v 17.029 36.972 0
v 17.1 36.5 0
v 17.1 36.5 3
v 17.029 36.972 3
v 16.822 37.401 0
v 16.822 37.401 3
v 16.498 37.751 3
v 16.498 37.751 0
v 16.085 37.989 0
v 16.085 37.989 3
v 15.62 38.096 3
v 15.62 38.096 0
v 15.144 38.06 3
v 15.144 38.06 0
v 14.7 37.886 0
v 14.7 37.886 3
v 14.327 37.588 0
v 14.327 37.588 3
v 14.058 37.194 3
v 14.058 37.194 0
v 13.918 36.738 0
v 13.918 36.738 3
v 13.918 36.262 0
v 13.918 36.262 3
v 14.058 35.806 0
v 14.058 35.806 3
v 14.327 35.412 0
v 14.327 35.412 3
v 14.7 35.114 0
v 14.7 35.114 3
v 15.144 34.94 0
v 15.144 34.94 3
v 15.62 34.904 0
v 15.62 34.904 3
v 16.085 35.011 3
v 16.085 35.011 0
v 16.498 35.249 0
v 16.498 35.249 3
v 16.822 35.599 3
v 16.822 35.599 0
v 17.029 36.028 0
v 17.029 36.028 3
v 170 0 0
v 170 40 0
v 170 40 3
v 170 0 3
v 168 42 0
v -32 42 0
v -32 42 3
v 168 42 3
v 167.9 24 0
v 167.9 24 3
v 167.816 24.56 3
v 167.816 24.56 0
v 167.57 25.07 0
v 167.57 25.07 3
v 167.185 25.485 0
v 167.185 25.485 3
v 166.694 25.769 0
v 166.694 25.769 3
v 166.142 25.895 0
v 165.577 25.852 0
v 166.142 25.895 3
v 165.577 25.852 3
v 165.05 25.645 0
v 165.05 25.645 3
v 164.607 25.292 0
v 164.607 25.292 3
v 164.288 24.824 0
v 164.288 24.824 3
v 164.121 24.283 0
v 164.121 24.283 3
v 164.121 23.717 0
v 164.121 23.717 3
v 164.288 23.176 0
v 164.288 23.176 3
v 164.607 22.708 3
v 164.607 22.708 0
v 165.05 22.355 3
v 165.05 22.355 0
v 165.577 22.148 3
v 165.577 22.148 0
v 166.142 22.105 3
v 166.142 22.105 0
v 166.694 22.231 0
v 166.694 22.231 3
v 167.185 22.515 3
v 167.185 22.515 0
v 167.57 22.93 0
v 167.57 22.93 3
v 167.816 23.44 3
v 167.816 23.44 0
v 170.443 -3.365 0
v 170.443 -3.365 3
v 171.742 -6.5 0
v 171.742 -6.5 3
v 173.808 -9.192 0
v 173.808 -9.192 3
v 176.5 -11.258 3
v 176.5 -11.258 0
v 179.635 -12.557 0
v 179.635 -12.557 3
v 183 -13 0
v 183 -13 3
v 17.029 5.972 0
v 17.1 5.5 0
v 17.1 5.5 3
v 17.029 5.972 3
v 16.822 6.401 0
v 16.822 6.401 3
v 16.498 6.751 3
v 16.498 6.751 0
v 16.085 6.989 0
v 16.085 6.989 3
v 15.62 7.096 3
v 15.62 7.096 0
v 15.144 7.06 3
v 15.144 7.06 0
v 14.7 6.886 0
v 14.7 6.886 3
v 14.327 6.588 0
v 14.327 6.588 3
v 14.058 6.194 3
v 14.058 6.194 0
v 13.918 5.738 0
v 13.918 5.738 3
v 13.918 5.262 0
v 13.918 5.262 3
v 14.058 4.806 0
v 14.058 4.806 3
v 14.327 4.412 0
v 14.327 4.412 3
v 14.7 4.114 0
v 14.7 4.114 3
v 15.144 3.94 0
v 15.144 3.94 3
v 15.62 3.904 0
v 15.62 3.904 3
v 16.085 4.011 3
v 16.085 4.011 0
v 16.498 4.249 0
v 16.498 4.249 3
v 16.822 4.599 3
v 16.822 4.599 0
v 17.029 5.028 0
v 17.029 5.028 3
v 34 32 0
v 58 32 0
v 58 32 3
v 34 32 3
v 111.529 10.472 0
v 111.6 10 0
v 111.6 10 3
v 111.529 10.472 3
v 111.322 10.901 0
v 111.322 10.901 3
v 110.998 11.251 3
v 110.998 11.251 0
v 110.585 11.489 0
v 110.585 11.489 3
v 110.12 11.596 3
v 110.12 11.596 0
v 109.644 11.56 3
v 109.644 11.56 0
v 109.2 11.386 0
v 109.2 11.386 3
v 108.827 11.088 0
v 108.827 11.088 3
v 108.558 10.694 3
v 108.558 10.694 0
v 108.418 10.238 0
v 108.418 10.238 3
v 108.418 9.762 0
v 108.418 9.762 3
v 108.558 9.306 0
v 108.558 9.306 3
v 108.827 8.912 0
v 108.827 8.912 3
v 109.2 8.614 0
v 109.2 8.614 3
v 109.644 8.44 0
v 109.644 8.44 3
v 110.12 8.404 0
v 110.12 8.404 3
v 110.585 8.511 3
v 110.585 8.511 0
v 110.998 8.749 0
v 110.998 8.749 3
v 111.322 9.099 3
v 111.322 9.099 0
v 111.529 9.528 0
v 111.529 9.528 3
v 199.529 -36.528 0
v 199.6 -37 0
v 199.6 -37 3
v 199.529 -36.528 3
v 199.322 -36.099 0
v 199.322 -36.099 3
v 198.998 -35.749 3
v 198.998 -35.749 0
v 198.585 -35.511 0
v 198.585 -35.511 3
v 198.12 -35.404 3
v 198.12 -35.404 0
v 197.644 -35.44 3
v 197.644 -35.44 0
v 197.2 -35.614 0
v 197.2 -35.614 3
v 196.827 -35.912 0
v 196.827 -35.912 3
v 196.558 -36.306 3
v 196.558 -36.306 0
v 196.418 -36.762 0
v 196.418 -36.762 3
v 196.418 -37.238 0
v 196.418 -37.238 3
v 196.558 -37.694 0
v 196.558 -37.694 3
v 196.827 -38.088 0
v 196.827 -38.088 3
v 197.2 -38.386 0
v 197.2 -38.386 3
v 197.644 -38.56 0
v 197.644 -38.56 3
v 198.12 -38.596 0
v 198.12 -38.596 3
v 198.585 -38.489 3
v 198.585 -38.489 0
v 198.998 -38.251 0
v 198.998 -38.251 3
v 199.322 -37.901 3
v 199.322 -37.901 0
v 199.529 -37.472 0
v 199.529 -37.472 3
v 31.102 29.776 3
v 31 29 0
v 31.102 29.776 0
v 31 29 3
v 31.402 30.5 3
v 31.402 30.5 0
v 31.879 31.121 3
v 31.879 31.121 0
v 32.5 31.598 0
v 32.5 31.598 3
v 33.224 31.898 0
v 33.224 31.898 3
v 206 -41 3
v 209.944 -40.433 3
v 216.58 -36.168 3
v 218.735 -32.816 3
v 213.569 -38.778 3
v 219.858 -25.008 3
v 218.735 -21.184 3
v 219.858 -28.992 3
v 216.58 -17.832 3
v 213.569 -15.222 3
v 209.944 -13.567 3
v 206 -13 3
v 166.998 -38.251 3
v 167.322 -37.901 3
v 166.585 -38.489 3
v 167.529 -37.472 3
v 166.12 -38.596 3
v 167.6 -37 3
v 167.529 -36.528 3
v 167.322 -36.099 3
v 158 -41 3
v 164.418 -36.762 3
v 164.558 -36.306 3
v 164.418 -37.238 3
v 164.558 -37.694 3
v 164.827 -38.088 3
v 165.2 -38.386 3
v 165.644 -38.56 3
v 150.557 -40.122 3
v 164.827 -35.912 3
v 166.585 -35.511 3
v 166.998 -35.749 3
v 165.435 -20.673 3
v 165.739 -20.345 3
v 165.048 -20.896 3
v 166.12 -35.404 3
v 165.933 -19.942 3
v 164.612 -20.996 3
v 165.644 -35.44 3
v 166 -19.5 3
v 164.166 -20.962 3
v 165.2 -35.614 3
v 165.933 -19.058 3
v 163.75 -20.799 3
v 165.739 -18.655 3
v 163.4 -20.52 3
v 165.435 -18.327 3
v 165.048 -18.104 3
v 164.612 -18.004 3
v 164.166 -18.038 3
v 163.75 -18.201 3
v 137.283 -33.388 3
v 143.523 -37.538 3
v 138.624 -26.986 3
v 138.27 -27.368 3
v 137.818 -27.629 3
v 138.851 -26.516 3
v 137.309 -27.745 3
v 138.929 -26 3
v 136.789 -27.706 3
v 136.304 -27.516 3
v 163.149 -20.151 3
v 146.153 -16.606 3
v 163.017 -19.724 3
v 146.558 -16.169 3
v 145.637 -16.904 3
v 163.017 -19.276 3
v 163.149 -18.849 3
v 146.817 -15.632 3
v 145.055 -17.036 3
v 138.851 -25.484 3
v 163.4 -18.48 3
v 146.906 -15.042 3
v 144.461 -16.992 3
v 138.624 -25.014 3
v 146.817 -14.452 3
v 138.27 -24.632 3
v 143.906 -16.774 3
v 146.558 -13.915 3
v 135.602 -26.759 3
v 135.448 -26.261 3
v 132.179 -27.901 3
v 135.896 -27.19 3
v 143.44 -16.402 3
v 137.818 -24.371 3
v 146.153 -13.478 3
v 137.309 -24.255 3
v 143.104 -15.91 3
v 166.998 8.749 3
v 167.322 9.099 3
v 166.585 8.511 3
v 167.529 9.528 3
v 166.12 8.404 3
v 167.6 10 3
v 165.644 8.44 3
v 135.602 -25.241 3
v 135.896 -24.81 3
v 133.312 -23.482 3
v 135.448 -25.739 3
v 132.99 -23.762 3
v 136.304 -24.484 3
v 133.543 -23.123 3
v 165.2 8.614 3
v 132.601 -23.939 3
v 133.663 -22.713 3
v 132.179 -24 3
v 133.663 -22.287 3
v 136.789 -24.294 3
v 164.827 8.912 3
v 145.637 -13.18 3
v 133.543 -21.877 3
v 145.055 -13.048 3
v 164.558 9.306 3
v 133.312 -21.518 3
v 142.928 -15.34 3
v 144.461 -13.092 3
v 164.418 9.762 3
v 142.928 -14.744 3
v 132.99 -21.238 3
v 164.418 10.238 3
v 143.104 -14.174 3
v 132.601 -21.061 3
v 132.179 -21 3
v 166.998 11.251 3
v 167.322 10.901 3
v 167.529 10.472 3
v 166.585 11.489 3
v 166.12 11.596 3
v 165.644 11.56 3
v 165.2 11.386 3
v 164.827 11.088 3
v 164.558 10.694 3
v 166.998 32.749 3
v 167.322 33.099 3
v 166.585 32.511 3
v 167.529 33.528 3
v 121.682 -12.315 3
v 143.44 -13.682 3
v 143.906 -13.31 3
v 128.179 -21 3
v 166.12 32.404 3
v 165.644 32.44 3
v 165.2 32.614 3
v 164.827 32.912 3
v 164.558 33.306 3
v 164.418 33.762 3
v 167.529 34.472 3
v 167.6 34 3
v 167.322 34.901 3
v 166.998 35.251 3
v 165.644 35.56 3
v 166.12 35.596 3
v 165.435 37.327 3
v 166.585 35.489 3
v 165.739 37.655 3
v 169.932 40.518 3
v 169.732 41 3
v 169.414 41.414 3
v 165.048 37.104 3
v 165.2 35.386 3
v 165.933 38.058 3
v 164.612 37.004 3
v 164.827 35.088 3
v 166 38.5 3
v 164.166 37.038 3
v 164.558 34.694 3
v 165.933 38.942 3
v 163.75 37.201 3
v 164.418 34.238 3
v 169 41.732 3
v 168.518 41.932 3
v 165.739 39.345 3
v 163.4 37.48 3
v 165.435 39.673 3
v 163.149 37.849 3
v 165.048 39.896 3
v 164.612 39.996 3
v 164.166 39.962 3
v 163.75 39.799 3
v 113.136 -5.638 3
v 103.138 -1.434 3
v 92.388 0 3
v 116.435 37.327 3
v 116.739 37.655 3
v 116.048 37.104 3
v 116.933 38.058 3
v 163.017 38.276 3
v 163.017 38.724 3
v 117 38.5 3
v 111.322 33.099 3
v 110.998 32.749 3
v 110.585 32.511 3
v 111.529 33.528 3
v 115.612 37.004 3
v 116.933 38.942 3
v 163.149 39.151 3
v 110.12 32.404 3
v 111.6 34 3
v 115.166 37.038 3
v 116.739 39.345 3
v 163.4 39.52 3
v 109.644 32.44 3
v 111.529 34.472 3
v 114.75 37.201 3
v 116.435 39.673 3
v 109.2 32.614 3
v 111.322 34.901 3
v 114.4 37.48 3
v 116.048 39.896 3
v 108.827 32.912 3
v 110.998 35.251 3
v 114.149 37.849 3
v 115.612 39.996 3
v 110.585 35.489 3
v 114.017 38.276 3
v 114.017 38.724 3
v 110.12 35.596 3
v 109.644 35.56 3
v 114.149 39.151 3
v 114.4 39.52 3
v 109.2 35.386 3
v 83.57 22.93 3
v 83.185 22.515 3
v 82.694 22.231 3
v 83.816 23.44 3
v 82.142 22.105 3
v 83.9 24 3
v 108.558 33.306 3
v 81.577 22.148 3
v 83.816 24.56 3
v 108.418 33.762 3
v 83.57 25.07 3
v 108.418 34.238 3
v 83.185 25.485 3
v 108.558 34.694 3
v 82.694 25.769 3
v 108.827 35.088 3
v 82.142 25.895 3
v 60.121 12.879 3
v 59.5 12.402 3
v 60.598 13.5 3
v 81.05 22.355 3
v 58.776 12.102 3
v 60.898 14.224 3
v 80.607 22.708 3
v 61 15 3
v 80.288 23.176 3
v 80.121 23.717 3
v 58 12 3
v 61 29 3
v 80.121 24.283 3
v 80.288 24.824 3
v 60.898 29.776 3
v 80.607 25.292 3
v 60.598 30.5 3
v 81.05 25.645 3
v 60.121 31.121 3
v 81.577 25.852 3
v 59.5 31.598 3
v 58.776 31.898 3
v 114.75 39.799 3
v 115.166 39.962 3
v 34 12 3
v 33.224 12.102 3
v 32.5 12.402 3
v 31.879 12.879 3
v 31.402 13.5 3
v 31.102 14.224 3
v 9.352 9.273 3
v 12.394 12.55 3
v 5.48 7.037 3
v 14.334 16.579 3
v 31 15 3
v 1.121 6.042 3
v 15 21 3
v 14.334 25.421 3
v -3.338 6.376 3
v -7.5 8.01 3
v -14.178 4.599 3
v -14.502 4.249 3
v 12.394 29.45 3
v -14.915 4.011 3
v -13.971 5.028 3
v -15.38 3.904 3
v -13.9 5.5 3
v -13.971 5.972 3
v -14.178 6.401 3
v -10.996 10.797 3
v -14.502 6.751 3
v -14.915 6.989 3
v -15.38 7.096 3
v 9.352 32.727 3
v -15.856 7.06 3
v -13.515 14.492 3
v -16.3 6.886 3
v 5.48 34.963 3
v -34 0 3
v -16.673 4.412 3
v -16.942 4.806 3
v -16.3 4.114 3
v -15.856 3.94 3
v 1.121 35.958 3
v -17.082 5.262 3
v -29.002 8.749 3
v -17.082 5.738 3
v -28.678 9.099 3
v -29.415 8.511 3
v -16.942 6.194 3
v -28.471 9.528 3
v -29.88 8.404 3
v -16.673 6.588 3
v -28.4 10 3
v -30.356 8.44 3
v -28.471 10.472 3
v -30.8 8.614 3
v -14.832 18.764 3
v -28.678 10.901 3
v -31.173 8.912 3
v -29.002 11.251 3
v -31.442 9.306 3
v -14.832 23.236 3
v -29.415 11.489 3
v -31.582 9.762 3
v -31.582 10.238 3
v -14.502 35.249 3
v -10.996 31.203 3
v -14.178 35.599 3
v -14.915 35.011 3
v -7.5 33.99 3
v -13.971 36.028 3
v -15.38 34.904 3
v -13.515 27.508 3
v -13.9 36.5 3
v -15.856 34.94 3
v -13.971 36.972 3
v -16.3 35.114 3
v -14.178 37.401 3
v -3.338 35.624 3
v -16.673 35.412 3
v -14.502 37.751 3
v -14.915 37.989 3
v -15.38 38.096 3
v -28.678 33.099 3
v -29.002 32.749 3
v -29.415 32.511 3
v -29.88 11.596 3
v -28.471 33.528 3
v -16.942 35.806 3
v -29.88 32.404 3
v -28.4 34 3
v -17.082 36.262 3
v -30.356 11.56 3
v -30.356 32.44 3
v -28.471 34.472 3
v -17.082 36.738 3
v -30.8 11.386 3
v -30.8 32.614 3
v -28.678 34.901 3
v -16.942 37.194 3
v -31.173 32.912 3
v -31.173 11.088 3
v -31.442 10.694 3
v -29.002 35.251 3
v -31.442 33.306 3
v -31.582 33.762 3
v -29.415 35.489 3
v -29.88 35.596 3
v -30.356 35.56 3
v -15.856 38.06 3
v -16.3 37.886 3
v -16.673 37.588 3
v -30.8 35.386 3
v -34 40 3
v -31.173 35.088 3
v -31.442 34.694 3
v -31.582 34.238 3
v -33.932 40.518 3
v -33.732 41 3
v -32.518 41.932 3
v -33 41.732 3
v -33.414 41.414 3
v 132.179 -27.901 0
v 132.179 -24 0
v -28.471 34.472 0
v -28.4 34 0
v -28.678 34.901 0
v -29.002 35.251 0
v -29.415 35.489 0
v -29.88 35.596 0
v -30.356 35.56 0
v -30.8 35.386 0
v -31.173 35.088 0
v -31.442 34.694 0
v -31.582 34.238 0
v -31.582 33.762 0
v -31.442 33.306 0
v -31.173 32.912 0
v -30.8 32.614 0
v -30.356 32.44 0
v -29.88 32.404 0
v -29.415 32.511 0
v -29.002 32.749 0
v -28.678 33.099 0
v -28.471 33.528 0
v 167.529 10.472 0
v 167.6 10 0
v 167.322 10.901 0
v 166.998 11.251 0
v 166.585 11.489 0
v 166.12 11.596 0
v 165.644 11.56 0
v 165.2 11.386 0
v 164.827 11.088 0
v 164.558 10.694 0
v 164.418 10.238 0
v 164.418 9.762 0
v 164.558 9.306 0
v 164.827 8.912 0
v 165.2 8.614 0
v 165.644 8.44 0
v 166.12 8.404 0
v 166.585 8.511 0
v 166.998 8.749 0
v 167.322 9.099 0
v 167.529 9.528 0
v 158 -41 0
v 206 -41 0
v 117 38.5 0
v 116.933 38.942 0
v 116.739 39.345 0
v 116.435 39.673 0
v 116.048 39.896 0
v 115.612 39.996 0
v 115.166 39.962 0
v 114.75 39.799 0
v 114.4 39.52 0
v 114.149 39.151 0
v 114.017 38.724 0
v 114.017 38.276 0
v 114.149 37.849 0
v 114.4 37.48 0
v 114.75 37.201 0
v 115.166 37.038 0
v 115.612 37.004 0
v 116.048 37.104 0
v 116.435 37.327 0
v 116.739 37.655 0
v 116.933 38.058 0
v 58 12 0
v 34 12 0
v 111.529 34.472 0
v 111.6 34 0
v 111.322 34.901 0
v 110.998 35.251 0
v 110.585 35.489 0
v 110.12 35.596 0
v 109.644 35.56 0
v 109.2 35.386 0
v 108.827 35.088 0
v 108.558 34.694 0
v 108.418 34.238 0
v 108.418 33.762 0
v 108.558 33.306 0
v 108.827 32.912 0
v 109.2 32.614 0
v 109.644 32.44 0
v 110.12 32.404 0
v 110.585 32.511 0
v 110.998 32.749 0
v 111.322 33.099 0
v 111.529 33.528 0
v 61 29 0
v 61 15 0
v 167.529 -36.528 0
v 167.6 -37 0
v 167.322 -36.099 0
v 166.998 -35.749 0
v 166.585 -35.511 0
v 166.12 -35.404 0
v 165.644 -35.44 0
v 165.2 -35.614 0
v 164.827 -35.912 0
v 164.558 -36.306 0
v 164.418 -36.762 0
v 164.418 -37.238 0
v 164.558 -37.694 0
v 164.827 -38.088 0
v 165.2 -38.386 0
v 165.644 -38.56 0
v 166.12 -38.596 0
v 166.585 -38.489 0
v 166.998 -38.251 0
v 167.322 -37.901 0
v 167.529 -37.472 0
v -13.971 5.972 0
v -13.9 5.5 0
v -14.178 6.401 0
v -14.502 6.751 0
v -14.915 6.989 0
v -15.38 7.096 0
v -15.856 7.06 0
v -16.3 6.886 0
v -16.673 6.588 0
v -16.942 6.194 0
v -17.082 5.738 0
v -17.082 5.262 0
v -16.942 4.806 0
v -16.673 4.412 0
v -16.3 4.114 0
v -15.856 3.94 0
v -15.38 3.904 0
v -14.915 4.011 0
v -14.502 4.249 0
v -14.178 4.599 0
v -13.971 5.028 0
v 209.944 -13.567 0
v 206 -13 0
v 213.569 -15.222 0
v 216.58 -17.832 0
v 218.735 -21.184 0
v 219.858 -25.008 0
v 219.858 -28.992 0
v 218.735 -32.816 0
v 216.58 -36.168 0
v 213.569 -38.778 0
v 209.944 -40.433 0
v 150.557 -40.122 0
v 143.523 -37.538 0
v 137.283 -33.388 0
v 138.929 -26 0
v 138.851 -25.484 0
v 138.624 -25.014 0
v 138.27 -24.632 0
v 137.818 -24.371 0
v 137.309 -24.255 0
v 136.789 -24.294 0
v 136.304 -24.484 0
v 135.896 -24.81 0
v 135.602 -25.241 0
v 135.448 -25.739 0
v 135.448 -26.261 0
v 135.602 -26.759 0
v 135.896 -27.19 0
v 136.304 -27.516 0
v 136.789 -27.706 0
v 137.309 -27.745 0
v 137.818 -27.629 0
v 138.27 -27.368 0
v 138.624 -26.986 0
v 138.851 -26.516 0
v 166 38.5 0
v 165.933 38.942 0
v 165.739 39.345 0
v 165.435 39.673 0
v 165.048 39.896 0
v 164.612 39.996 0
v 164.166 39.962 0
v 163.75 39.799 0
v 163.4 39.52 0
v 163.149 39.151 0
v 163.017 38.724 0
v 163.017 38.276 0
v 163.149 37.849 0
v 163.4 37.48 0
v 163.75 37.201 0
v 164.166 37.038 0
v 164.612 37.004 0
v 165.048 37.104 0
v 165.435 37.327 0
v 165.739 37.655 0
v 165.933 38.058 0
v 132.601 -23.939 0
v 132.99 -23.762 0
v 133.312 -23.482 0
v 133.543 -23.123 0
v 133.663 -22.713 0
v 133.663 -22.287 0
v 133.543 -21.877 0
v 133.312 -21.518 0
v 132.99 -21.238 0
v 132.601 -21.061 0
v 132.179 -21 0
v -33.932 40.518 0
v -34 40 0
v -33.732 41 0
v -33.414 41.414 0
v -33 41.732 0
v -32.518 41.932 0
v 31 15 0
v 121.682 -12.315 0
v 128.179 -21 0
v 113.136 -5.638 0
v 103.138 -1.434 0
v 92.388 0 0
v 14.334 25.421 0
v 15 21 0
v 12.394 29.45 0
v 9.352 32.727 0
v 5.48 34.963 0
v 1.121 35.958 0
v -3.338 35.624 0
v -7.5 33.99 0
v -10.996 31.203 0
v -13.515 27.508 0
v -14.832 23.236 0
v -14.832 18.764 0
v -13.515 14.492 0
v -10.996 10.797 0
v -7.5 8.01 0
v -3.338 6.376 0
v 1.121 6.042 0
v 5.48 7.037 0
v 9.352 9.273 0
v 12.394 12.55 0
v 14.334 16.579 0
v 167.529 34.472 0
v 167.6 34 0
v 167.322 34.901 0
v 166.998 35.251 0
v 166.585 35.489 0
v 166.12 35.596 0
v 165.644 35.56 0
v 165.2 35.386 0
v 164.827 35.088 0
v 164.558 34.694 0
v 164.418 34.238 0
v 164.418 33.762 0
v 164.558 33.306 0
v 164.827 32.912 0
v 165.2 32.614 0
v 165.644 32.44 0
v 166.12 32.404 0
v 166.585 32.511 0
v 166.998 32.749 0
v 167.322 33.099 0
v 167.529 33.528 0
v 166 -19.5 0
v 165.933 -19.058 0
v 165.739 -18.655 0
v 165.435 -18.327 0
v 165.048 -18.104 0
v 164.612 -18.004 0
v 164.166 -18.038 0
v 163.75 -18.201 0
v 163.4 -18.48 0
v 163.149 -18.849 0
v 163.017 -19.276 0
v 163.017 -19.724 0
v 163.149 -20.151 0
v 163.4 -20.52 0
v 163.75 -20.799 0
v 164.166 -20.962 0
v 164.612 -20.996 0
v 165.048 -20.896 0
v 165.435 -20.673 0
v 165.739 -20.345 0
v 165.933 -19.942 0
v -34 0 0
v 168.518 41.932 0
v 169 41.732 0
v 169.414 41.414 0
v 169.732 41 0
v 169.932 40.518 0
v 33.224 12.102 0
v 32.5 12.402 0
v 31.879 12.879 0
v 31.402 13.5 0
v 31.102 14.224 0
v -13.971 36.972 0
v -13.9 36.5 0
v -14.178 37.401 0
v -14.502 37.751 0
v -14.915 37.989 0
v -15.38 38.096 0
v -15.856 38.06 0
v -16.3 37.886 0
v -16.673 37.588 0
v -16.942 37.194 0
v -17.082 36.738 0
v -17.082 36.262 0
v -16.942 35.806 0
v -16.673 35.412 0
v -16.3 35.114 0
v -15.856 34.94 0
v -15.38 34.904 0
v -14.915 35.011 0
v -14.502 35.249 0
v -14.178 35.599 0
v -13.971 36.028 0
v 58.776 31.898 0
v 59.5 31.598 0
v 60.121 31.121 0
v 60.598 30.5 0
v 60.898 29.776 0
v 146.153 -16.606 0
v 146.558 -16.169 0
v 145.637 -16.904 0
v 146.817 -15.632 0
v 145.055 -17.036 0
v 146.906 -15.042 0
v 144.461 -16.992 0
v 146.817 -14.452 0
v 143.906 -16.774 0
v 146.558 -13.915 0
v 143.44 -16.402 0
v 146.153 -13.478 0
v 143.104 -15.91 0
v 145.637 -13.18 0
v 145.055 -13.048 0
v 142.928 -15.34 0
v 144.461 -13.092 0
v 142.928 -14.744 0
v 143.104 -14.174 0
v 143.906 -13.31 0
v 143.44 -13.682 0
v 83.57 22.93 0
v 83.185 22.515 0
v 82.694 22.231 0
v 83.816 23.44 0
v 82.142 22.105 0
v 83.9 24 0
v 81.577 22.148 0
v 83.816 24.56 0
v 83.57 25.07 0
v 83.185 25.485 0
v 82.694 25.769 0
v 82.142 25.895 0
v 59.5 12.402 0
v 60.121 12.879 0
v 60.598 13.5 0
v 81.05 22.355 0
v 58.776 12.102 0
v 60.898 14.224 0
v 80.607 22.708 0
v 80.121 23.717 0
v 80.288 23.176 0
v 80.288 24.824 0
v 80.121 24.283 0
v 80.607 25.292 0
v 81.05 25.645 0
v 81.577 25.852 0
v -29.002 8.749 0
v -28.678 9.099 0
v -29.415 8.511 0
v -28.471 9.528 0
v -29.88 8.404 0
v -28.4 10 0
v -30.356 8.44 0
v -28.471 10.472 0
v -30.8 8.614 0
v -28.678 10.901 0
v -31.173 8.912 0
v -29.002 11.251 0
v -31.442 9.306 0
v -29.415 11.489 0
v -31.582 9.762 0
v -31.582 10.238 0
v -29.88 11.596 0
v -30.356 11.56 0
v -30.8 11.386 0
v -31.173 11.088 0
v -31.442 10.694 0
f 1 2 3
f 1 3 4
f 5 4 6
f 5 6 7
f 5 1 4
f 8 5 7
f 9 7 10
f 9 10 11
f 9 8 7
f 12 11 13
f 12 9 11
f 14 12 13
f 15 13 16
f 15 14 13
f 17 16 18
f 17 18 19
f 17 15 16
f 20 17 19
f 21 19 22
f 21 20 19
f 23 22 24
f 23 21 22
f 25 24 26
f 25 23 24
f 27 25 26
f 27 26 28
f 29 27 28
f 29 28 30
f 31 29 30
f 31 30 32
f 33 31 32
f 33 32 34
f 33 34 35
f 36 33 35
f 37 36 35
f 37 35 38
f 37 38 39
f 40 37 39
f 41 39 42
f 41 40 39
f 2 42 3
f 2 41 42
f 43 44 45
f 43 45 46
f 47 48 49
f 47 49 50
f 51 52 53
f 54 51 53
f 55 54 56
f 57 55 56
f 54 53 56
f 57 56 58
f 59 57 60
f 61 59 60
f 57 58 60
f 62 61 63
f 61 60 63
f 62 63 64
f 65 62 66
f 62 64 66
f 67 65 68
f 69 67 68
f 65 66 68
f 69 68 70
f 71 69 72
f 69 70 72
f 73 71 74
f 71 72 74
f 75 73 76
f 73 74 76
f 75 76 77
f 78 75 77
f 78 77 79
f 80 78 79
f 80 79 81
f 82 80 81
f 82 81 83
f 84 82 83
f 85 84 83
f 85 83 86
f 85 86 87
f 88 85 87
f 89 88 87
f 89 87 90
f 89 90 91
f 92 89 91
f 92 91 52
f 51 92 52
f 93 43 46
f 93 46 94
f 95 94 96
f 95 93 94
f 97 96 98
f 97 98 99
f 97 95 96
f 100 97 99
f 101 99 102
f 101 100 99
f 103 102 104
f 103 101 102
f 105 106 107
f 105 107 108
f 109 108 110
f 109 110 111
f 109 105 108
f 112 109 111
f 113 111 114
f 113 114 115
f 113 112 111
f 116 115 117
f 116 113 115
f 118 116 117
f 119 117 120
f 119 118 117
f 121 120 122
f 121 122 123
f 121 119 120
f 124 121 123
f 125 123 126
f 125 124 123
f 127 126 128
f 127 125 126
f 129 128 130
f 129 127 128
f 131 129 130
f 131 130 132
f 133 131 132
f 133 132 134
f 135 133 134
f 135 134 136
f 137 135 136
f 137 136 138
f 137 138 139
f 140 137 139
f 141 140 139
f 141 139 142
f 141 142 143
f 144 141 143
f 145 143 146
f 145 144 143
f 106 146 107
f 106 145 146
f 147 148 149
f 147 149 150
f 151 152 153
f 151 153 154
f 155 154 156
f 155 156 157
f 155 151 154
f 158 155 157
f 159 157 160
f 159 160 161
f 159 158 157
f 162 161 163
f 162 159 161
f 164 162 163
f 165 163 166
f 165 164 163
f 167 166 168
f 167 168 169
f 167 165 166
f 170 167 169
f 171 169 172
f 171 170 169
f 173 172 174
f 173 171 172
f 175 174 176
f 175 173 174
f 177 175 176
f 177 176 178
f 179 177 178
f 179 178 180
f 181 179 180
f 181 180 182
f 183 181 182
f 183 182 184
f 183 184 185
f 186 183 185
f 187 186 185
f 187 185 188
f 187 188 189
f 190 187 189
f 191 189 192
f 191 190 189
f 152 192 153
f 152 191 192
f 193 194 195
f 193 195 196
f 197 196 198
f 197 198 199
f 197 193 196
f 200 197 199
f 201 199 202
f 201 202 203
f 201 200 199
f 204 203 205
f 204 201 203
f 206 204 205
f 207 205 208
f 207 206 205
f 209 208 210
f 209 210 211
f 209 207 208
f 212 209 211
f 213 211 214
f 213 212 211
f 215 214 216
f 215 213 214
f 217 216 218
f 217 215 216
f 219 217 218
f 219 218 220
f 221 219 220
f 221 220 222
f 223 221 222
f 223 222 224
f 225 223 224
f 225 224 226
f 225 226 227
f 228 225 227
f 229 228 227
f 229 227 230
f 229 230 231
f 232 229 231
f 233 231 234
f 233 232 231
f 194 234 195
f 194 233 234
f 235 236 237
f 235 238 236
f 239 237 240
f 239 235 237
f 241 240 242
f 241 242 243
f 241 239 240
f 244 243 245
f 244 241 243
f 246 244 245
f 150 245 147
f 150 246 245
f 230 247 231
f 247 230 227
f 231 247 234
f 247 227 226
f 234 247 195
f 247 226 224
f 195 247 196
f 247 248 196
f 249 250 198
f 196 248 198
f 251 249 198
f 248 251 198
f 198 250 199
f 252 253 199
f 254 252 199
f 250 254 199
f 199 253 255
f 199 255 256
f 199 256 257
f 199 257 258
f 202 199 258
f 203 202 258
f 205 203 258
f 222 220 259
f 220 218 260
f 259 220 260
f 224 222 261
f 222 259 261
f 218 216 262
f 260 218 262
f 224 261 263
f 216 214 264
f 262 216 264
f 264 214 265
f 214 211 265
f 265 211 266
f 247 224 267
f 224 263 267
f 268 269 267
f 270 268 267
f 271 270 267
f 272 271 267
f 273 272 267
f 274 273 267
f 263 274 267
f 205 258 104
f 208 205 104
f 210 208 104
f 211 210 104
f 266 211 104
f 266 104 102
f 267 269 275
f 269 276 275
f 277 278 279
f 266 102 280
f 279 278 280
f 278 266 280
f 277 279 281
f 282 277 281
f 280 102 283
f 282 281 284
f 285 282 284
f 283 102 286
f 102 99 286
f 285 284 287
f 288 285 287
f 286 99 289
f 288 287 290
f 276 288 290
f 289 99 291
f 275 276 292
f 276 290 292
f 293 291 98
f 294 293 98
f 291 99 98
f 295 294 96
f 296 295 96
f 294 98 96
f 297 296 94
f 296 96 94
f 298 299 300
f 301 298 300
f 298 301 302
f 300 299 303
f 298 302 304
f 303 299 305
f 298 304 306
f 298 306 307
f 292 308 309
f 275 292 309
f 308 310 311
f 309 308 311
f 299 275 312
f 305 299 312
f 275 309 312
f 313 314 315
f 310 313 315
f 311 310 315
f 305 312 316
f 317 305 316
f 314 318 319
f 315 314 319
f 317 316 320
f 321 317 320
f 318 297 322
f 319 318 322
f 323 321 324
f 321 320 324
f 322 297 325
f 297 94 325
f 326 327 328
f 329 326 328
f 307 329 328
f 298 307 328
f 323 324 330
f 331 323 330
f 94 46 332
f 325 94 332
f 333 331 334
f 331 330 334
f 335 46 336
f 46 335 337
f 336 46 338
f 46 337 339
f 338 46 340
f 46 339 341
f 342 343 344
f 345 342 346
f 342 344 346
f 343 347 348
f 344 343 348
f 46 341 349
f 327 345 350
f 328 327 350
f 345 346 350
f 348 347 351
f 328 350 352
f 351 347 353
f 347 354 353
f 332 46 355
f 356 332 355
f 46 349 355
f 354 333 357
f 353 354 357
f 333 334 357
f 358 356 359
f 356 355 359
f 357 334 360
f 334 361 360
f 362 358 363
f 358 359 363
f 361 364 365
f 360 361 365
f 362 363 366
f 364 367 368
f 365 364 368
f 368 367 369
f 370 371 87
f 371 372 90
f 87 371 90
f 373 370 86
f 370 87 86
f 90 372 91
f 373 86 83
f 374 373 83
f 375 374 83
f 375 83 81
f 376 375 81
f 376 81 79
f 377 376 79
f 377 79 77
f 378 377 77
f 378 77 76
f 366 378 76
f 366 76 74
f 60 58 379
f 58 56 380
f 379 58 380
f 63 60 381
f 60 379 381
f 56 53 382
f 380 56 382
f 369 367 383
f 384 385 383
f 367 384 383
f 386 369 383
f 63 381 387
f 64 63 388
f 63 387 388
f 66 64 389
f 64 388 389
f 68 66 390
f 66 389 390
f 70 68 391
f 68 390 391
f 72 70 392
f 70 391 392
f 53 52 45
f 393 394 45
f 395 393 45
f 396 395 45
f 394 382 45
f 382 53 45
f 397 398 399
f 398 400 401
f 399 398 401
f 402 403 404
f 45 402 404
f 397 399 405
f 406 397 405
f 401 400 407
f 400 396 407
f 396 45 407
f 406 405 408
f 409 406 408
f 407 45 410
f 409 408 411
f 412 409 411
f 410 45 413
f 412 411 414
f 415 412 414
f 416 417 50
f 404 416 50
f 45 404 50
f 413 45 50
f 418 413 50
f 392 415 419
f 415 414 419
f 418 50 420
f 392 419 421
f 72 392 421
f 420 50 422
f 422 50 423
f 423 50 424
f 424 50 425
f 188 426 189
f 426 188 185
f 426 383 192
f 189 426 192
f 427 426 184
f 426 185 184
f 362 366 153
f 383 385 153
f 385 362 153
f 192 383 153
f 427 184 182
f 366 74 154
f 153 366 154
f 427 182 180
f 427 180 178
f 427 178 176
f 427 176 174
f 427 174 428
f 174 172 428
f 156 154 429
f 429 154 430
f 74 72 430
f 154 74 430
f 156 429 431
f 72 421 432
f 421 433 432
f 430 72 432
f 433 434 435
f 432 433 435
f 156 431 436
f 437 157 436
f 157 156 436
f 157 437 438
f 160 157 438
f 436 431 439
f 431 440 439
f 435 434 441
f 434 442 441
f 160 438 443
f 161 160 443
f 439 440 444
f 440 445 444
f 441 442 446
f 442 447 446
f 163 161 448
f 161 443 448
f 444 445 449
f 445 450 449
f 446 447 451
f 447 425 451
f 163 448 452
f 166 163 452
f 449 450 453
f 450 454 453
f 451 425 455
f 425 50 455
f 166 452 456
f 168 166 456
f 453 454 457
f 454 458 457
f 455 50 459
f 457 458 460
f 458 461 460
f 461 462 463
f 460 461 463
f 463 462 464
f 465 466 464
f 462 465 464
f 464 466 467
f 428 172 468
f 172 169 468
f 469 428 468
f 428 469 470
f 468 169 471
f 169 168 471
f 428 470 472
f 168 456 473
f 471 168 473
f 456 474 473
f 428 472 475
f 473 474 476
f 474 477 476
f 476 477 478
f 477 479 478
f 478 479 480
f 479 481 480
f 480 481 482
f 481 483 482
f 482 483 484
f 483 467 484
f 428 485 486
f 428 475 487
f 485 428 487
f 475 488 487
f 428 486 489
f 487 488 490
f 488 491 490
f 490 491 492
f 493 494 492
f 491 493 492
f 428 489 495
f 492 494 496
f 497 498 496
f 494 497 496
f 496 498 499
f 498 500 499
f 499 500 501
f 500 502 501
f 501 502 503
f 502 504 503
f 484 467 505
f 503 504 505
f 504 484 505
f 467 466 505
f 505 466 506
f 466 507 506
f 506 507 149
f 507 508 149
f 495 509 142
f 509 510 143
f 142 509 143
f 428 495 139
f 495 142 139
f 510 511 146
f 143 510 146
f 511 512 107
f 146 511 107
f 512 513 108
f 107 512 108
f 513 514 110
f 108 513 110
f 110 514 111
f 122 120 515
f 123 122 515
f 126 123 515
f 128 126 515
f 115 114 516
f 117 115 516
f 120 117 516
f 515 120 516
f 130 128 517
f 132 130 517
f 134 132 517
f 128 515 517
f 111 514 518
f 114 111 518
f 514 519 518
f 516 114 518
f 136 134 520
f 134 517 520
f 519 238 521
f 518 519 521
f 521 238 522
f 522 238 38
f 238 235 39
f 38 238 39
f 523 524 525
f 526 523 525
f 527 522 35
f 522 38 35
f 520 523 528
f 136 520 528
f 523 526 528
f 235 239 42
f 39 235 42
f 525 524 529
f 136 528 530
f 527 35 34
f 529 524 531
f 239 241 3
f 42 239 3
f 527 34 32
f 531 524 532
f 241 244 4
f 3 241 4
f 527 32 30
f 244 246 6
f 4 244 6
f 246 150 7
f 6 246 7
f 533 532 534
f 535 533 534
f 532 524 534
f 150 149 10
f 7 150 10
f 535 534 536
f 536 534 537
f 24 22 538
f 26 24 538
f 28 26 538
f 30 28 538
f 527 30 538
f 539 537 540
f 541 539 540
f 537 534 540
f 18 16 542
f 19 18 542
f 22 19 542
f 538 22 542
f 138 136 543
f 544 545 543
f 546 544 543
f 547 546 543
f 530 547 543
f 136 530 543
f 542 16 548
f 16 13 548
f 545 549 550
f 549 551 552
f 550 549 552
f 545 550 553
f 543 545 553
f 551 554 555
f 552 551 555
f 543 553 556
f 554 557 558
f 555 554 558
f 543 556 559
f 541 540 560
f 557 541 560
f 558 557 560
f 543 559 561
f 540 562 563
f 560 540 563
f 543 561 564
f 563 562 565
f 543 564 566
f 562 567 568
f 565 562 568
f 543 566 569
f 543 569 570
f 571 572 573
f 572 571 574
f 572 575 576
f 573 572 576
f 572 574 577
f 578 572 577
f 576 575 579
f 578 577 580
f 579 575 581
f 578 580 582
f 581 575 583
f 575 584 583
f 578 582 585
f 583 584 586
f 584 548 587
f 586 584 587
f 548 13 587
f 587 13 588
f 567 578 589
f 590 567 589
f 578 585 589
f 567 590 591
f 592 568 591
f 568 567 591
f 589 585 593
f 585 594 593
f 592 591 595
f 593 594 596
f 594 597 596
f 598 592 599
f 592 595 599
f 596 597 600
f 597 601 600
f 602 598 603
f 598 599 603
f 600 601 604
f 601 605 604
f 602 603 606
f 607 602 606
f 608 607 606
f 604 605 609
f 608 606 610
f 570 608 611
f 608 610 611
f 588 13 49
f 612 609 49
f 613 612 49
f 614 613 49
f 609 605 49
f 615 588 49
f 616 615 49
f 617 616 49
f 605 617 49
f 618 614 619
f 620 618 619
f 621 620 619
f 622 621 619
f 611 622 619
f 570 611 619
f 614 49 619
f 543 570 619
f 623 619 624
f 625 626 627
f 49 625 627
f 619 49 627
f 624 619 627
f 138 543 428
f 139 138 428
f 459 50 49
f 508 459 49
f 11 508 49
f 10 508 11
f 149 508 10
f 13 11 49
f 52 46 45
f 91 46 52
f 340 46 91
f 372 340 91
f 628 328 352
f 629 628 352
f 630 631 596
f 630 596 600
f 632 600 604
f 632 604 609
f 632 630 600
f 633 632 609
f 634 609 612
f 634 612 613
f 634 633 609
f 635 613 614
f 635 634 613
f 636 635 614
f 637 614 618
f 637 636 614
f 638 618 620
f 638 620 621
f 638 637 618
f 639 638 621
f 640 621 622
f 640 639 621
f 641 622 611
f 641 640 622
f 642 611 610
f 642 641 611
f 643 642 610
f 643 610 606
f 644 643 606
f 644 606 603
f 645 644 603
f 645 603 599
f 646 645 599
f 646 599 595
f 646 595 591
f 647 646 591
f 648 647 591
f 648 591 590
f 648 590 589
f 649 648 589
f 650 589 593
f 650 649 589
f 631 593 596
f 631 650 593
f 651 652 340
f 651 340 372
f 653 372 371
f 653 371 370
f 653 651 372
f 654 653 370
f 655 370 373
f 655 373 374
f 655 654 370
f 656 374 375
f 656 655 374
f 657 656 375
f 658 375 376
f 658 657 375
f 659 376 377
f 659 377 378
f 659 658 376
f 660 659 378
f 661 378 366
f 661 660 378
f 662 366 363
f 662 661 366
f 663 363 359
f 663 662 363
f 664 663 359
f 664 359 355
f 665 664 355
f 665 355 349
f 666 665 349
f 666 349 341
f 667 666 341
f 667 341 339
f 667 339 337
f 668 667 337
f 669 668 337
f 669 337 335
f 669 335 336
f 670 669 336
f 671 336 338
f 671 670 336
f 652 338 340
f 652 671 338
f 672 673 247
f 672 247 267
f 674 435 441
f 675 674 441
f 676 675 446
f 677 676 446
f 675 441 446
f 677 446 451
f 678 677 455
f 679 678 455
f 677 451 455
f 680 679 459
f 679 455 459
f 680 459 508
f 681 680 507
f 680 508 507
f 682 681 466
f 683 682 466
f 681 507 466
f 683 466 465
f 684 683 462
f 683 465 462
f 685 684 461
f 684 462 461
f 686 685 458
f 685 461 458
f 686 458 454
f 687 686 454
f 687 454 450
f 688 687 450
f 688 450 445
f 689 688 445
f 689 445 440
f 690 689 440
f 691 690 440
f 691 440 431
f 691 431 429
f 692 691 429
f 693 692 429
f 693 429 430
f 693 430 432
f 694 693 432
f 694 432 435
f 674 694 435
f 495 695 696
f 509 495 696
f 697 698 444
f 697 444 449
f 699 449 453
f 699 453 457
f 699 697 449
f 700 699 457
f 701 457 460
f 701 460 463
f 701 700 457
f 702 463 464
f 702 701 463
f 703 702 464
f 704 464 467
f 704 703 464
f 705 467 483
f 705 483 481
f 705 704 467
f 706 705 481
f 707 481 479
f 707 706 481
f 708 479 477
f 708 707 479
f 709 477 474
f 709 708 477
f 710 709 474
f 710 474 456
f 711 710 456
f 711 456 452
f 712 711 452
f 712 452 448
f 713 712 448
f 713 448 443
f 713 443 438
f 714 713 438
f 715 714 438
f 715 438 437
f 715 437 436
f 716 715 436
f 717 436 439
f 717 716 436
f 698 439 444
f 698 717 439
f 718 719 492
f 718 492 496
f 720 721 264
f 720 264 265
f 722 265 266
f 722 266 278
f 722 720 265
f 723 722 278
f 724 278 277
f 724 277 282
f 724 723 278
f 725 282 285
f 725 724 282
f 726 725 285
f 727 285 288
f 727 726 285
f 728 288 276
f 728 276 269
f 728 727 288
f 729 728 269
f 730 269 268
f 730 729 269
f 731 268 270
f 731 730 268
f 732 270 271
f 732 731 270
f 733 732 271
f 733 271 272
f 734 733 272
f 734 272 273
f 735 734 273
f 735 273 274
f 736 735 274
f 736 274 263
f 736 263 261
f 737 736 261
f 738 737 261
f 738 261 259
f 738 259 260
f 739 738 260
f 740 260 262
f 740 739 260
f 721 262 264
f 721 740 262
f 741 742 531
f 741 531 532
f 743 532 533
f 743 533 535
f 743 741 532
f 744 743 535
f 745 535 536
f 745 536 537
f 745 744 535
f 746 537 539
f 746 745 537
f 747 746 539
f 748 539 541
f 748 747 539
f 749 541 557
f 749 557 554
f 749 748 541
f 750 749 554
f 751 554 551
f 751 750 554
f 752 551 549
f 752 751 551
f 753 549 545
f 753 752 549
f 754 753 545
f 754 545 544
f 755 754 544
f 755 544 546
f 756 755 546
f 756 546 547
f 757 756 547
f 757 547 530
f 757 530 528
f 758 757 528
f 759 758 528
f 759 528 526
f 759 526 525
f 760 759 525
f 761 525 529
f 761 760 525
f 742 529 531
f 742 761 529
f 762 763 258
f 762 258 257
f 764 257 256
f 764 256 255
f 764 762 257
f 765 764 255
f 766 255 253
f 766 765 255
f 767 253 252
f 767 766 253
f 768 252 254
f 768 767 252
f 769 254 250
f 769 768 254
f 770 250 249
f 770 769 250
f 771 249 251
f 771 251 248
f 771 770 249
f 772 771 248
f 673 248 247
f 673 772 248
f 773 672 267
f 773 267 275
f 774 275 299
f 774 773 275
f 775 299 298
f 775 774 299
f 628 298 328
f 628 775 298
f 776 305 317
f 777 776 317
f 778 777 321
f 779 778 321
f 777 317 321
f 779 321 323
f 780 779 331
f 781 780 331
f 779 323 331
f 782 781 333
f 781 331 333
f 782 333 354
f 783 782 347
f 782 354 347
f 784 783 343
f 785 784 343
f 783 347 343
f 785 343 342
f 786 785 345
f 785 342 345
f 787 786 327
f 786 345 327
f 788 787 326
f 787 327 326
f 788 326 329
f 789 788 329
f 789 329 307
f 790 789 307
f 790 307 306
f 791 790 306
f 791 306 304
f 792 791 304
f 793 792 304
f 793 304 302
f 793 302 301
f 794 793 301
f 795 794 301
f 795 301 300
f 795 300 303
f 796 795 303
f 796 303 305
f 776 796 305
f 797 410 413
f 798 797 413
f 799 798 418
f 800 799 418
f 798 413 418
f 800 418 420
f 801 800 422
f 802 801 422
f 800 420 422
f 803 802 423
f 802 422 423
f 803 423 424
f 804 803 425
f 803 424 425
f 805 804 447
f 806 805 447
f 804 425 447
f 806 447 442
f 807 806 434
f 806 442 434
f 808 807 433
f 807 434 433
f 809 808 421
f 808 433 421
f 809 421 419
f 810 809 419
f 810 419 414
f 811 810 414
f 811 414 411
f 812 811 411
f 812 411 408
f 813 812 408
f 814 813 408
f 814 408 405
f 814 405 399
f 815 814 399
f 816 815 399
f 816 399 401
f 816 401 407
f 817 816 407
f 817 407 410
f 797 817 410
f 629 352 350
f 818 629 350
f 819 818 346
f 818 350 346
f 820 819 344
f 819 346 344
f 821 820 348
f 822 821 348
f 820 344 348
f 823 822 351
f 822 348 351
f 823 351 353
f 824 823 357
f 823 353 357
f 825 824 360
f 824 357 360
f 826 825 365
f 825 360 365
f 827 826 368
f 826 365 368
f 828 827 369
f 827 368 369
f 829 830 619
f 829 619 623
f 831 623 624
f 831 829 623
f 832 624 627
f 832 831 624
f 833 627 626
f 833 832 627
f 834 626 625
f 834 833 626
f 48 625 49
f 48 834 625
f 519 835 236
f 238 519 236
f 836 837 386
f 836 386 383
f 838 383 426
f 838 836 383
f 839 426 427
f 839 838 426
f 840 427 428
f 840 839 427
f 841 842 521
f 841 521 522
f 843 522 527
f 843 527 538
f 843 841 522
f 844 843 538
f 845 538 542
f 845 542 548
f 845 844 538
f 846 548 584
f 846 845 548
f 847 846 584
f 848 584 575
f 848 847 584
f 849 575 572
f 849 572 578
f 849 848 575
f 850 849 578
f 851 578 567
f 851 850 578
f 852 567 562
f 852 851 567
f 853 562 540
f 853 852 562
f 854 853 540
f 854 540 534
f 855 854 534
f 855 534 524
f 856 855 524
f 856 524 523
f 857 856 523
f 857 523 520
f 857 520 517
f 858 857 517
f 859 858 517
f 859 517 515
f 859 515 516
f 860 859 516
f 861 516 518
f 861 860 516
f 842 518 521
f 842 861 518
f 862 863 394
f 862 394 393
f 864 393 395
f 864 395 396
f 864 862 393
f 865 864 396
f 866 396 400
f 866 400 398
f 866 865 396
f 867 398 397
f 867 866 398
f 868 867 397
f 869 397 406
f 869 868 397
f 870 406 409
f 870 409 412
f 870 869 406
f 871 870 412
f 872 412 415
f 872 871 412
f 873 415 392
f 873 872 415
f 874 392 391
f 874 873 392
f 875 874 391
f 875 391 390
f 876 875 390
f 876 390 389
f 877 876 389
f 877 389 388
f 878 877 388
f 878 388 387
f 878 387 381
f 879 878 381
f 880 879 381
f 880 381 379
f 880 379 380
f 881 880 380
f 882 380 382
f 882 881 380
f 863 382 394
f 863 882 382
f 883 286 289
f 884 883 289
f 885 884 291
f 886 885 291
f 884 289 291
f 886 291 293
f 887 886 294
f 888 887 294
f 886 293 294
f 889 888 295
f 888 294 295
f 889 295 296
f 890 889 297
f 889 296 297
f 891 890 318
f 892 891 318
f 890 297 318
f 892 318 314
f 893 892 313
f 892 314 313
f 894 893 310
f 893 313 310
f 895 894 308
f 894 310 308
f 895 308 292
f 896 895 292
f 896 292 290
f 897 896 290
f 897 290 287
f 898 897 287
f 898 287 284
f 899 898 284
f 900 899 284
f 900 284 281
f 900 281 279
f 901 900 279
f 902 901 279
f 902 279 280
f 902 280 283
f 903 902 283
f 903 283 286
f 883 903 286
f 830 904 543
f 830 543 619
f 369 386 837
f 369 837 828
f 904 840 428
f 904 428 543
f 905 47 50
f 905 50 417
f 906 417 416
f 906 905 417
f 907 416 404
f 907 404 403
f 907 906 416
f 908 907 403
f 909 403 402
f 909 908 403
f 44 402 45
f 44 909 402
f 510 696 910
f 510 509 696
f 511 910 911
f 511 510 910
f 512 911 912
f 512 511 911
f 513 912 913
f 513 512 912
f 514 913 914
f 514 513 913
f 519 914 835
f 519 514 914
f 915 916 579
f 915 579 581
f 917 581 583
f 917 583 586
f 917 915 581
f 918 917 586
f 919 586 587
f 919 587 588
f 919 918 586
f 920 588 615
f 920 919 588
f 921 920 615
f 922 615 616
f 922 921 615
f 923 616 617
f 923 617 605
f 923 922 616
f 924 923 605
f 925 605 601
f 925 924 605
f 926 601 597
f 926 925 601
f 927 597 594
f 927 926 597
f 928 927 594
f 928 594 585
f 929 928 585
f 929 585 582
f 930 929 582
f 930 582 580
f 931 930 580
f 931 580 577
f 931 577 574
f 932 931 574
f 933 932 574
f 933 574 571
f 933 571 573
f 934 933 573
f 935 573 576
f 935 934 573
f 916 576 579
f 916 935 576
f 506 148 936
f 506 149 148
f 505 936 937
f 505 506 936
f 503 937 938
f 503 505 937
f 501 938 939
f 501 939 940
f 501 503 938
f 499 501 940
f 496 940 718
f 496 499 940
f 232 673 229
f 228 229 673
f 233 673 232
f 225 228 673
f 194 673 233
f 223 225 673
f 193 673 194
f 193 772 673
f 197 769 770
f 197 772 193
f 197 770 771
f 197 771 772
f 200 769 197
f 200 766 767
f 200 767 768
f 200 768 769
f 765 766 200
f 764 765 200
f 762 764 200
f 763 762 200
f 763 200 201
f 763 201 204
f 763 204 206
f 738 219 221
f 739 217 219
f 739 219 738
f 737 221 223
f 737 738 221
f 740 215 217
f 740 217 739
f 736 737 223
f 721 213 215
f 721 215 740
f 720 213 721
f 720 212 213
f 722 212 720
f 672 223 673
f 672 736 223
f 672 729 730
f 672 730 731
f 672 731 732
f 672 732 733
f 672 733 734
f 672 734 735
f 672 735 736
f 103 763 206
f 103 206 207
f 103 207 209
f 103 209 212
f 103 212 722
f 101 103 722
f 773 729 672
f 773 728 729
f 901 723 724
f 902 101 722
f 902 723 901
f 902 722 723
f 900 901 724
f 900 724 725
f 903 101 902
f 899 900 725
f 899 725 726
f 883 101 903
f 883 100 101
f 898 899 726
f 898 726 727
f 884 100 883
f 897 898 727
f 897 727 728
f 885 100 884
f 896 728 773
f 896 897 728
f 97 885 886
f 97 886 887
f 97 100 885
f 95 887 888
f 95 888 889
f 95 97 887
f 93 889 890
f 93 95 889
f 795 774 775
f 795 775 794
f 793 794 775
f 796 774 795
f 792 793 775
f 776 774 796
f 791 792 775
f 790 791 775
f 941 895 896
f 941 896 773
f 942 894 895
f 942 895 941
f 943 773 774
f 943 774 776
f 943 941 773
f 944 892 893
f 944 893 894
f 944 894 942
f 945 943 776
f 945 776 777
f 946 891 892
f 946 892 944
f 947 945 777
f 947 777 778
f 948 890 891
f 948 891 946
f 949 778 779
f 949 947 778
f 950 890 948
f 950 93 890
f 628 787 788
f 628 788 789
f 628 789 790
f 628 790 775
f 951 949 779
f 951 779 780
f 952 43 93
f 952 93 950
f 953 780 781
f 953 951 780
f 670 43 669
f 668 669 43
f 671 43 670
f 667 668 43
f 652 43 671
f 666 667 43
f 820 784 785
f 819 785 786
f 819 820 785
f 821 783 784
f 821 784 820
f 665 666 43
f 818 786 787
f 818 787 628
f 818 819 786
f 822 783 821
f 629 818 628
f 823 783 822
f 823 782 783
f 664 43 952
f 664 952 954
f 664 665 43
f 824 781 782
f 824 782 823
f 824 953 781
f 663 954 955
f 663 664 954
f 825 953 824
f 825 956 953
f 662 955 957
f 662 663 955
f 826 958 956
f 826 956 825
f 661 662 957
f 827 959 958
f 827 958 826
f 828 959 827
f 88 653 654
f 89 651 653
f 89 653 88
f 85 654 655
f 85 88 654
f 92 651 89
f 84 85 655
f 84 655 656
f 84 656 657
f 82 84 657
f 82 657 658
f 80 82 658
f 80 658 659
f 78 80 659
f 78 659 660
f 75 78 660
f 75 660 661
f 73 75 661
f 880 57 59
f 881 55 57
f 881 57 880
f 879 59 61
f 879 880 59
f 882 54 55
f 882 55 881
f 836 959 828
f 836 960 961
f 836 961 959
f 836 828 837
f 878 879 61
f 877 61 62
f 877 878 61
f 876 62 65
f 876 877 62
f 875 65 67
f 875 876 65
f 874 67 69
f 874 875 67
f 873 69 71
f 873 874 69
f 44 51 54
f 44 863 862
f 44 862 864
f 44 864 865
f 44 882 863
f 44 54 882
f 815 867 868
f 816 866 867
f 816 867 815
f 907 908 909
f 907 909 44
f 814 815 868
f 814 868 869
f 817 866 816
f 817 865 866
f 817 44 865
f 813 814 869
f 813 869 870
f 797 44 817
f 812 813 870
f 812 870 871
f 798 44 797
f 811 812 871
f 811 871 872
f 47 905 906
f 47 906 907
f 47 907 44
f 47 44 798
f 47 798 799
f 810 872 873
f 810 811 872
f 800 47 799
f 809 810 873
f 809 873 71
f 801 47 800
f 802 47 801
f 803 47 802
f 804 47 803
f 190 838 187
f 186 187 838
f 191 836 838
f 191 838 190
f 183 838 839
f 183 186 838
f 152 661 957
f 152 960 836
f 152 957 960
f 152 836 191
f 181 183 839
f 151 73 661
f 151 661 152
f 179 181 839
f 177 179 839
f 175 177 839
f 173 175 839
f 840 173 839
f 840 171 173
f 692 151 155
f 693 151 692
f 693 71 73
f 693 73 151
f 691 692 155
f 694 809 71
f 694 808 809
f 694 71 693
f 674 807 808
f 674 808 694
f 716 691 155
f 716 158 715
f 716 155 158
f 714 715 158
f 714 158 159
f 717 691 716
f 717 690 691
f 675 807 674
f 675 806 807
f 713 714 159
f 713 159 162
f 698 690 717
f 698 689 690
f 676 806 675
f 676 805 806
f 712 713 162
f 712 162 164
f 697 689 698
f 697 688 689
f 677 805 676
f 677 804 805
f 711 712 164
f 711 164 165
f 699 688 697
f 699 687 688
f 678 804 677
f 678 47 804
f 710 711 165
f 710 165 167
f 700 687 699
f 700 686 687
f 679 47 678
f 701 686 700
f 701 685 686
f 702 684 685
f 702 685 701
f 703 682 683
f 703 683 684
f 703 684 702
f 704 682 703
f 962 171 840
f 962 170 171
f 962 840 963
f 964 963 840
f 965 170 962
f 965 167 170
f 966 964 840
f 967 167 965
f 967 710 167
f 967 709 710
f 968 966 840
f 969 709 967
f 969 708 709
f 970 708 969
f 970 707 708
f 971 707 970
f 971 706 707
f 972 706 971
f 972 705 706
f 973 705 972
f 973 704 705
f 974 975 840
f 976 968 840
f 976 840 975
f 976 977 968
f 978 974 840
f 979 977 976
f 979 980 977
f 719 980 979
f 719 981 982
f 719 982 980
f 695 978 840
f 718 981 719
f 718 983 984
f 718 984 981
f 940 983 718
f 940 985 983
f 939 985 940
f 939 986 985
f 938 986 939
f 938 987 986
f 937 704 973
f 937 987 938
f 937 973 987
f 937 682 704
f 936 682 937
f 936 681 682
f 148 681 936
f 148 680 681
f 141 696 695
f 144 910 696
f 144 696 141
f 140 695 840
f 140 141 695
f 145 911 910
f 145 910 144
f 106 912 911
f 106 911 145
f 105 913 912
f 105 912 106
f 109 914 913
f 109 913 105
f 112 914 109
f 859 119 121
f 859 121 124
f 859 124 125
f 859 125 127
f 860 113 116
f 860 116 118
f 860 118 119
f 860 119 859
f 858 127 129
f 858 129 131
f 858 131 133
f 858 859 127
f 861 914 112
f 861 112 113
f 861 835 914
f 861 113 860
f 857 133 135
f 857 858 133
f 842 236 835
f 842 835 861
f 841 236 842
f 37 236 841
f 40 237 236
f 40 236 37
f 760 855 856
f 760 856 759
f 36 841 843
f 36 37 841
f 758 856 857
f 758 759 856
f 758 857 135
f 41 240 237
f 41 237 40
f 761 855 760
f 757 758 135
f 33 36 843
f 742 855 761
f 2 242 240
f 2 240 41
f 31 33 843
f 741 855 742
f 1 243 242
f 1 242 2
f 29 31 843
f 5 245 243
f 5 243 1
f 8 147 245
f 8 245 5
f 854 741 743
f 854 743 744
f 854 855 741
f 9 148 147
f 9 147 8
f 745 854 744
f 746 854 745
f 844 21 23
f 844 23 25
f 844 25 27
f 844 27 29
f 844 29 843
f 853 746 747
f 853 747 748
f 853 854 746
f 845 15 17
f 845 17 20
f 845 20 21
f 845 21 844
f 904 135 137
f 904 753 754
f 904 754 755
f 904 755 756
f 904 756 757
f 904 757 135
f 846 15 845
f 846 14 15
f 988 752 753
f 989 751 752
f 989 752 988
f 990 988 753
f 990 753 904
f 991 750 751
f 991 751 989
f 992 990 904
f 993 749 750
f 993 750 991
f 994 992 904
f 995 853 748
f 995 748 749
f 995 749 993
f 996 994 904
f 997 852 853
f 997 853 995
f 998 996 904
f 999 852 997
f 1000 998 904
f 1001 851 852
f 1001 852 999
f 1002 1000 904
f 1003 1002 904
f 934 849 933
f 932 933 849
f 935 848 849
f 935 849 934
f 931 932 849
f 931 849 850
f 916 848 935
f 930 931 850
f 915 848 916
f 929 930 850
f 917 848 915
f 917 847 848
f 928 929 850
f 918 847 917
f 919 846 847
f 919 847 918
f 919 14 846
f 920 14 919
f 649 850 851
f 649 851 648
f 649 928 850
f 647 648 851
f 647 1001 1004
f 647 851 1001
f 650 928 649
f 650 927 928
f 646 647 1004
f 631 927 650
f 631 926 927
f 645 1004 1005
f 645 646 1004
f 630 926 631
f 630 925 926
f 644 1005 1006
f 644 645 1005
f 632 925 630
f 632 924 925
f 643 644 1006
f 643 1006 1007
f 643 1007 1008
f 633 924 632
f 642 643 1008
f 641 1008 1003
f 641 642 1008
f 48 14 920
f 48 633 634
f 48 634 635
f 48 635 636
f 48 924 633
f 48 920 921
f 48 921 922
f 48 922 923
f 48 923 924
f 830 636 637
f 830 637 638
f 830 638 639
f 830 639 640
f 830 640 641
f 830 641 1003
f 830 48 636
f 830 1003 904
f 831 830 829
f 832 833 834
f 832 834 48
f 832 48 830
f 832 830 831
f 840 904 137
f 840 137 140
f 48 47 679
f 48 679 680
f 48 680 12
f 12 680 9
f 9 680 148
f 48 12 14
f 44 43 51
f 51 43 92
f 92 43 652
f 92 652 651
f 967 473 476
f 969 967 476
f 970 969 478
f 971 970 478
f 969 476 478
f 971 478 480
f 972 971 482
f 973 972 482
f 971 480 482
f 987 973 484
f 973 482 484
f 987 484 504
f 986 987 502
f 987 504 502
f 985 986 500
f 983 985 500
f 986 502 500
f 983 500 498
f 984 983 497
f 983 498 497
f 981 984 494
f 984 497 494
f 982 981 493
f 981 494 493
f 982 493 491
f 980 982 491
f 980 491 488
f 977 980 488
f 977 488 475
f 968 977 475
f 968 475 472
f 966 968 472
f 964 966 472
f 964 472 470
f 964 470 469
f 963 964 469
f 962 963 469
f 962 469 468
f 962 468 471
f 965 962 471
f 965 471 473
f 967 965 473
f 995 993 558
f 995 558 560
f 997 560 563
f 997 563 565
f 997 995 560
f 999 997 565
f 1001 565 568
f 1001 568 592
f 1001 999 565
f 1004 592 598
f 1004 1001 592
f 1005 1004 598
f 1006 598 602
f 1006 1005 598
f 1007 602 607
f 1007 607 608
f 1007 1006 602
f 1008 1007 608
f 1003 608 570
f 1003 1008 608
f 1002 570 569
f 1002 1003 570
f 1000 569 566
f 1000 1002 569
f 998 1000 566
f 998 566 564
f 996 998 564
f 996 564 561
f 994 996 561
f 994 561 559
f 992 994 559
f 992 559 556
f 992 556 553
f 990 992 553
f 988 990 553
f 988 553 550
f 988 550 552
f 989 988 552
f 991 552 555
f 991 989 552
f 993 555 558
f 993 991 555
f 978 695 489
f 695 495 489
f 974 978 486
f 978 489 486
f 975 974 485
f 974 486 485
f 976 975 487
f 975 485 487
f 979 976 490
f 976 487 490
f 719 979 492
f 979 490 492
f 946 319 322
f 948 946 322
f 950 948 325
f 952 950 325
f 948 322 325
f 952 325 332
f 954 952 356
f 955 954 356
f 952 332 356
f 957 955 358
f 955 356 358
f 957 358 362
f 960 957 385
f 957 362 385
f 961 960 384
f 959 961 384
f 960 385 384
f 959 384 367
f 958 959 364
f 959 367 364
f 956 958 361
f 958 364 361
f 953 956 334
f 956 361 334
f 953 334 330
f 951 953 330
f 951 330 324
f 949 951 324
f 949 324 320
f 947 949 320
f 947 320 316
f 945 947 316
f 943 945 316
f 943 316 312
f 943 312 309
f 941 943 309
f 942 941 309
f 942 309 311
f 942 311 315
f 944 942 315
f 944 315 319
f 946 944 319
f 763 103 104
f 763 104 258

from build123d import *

# Parameters (mm, degrees)
SKETCH_1_R          = 1.6
SKETCH_1_R_2        = 15
EXTRUDE_1_DEPTH     = 3
SKETCH_3_W          = 4
SKETCH_3_H          = 20
CUT_EXTRUDE_2_DEPTH = 10
HOLE_WIZARD_1_D     = 3.5
HOLE_WIZARD_3_D     = 3
HOLE_WIZARD_6_D     = 3.8
HOLE_WIZARD_8_D     = 4
SKETCH_25_W         = 30
SKETCH_25_H         = 20
CUT_EXTRUDE_3_DEPTH = 10
FILLET_1_R          = 3
HOLE_WIZARD_9_D     = 3


with BuildPart() as part:
    # 草图1 → 凸台-拉伸1 (new body)
    with BuildSketch(Plane.XY):
        with BuildLine():
            Line((-34, 0), (-34, 40))
            ThreePointArc((-34, 40), (-33.414213562, 41.414213562), (-32, 42))
            Line((-32, 42), (168, 42))
            ThreePointArc((168, 42), (169.414213562, 41.414213562), (170, 40))
            Line((170, 40), (170, 0))
            ThreePointArc((170, 0), (173.807611845, -9.192388155), (183, -13))
            Line((183, -13), (206, -13))
            ThreePointArc((206, -13), (220, -27), (206, -41))
            Line((206, -41), (158, -41))
            ThreePointArc((158, -41), (141.042357362, -36.137397741), (129.238356686, -23.02739726))
            ThreePointArc((129.238356686, -23.02739726), (114.114480821, -6.230209144), (92.387501191, 0))
            Line((92.387501191, 0), (-34, 0))
        make_face()
        with Locations((15.5, 5.5)):
            Circle(SKETCH_1_R, mode=Mode.SUBTRACT)
        with Locations((-15.5, 5.5)):
            Circle(SKETCH_1_R, mode=Mode.SUBTRACT)
        with Locations((-15.5, 36.5)):
            Circle(SKETCH_1_R, mode=Mode.SUBTRACT)
        with Locations((15.5, 36.5)):
            Circle(SKETCH_1_R, mode=Mode.SUBTRACT)
        with Locations((166, 34)):
            Circle(SKETCH_1_R, mode=Mode.SUBTRACT)
        with Locations((166, 10)):
            Circle(SKETCH_1_R, mode=Mode.SUBTRACT)
        with Locations((-30, 10)):
            Circle(SKETCH_1_R, mode=Mode.SUBTRACT)
        with Locations((-30, 34)):
            Circle(SKETCH_1_R, mode=Mode.SUBTRACT)
        with Locations((0, 21)):
            Circle(SKETCH_1_R_2, mode=Mode.SUBTRACT)
        with Locations((166, -37)):
            Circle(SKETCH_1_R, mode=Mode.SUBTRACT)
        with Locations((198, -37)):
            Circle(SKETCH_1_R, mode=Mode.SUBTRACT)
        with Locations((110, 34)):
            Circle(SKETCH_1_R, mode=Mode.SUBTRACT)
        with Locations((110, 10)):
            Circle(SKETCH_1_R, mode=Mode.SUBTRACT)
    extrude(amount=EXTRUDE_1_DEPTH)

    # 草图3 → 切除-拉伸2 (cut)
    with BuildSketch(Plane.XY.offset(3)):
        with Locations((130.178561527, -31)):
            Rectangle(SKETCH_3_W, SKETCH_3_H)
    extrude(amount=-CUT_EXTRUDE_2_DEPTH, mode=Mode.SUBTRACT)

    # 孔1 (through all)
    with Locations(Plane(origin=(0, 0, 0), x_dir=(-1, 0, 0), z_dir=(0, 0, -1))):
        with Locations((-137.178561527, -26)):
            Hole(HOLE_WIZARD_1_D / 2)

    # 孔3 (through all)
    with Locations(Plane(origin=(0, 0, 0), x_dir=(-1, 0, 0), z_dir=(0, 0, -1))):
        with Locations((-164.5, 38.5), (-115.5, 38.5), (-164.5, -19.5)):
            Hole(HOLE_WIZARD_3_D / 2)

    # 孔6 (through all)
    with Locations(Plane(origin=(0, 0, 0), x_dir=(-1, 0, 0), z_dir=(0, 0, -1))):
        with Locations((-166, 24), (-82, 24)):
            Hole(HOLE_WIZARD_6_D / 2)

    # 孔8 (through all)
    with Locations(Plane(origin=(0, 0, 0), x_dir=(-1, 0, 0), z_dir=(0, 0, -1))):
        with Locations((-144.906, -15.042)):
            Hole(HOLE_WIZARD_8_D / 2)

    # 草图25 → 切除-拉伸3 (cut)
    with BuildSketch(Plane(origin=(0, 0, 0), x_dir=(-1, 0, 0), z_dir=(0, 0, -1))):
        with Locations((-46, 22)):
            Rectangle(SKETCH_25_W, SKETCH_25_H)
    extrude(amount=-CUT_EXTRUDE_3_DEPTH, mode=Mode.SUBTRACT)

    # 圆角1
    fillet_1_edges = [part.edges().sort_by_distance(p)[0] for p in [
        (61, 12, 1.5),
        (61, 32, 1.5),
        (31, 32, 1.5),
        (31, 12, 1.5),
    ]]
    fillet(fillet_1_edges, radius=FILLET_1_R)

    # 孔9 (through all)
    with Locations(Plane(origin=(0, 0, 0), x_dir=(-1, 0, 0), z_dir=(0, 0, -1))):
        with Locations((-132.178561527, -22.5)):
            Hole(HOLE_WIZARD_9_D / 2)


solid = part.part
